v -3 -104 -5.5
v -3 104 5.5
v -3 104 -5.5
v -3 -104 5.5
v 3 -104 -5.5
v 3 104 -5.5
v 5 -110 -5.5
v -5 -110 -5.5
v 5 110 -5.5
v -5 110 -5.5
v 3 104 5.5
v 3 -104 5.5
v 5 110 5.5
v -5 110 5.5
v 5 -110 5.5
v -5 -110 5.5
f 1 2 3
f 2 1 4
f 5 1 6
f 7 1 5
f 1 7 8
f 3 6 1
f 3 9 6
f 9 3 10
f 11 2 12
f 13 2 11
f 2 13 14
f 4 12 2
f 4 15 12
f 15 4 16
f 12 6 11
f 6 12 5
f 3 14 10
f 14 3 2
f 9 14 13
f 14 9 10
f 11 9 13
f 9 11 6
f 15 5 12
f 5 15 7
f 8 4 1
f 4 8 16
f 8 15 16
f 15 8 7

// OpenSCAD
// file: joint.scad
include <common.scad>
include <config.scad>

module joint_dovetail()
{
	rotate([90, 0, 0])
		translate([0, -(wall_dovetail_len / 2), (joint_depth / 2)])
			dovetail(
				length = wall_dovetail_len,
				depth = joint_depth,
				neck = joint_neck,
				head = joint_head
			);
}

module joint(joint_len)
{
	c_l = joint_neck;
	c_w = joint_len + eps;
	c_h = wall_dovetail_len;

	joint_x = 0;
	joint_y = (joint_len / 2) + (joint_depth / 2);
	joint_z = 0;

	union()
	{
		color(color_joint)
			cube([c_l, c_w, c_h], center=true);

		color(color_dovetail)
			translate([joint_x, joint_y, joint_z])
				rotate([0, 0, 0])
					joint_dovetail();

		color(color_dovetail)
			translate([-joint_x, -joint_y, joint_z])
				rotate([0, 0, 180])
					joint_dovetail();
	}
}

module joint_base()
{
	joint(shelf_w - (wall_t * 2));
}

module joint_modules()
{
	joint(clearance);
}
// file: config.scad
clearance = 0.25;
eps = 0.02;

color_dovetail = "red";
color_joint = "purple";
color_print = "white";
color_shelf = "green";
color_test = "black";
color_wall = "orange";

shelf_d = 67;
shelf_h_sep = 80;
shelf_t = 6;
shelf_w = 240;

wall_cut = 25;
wall_t = 16;

joint_depth = 6;
joint_neck = 6;
joint_head = 10;
back_stop = 5;

shelf_dovetail_len = shelf_d - back_stop;
wall_dovetail_len = wall_t - back_stop;
// file: common.scad
include <config.scad>

module dovetail(length,
	depth,
	neck,
	head)
{
	rotate([-90, 0, 0])
		linear_extrude(height = length, convexity = 10)
			polygon(points = [
				[-neck / 2, 0],
				[-head / 2, depth],
				[ head / 2, depth],
				[ neck / 2, 0]
			]);
}
// main file
include <common.scad>
include <config.scad>
include <joint.scad>

rotate([0, 180, 0])
	color(color_print)
		joint_base();
